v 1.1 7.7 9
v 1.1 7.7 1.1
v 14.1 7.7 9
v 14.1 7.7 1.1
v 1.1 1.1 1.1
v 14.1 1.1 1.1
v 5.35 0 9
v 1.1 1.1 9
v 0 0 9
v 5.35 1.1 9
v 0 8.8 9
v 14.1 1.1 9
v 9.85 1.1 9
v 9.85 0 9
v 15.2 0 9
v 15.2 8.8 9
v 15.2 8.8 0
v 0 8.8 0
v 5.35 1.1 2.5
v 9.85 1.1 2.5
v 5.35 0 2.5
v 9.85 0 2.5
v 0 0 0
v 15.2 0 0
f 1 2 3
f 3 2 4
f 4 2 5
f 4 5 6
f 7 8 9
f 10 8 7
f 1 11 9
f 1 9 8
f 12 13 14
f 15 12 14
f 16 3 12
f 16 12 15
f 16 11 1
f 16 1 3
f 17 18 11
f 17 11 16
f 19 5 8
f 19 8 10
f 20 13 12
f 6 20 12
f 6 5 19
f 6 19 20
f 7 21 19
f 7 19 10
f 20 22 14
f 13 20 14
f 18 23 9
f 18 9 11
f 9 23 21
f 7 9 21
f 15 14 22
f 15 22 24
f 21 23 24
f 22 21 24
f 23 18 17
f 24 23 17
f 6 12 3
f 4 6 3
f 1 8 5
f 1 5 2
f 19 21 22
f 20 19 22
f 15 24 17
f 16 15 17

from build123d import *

# Parameters (mm, degrees)
F0_W     = 15.2
F0_H     = 8.8
F1_DEPTH = 9
F2_T     = -1.1
F3_W     = 4.5
F3_H     = 6.5
F4_DEPTH = 1.1


with BuildPart() as f1:
    # F0 (on Top) → F1 (new body)
    with BuildSketch(Plane.XY):
        with Locations((7.6, 4.4)):
            Rectangle(F0_W, F0_H)
    extrude(amount=F1_DEPTH)

    # F2
    f2_openings = [f1.faces().sort_by_distance(p)[0] for p in [
        (7.6, 4.4, 9),
    ]]
    offset(amount=F2_T, openings=f2_openings)

    # F3 (on face) → F4 (cut, through all)
    with BuildSketch(Plane.XZ):
        with Locations((7.6, 5.75)):
            Rectangle(F3_W, F3_H)
    extrude(amount=-F4_DEPTH, mode=Mode.SUBTRACT)


solid = f1.part
